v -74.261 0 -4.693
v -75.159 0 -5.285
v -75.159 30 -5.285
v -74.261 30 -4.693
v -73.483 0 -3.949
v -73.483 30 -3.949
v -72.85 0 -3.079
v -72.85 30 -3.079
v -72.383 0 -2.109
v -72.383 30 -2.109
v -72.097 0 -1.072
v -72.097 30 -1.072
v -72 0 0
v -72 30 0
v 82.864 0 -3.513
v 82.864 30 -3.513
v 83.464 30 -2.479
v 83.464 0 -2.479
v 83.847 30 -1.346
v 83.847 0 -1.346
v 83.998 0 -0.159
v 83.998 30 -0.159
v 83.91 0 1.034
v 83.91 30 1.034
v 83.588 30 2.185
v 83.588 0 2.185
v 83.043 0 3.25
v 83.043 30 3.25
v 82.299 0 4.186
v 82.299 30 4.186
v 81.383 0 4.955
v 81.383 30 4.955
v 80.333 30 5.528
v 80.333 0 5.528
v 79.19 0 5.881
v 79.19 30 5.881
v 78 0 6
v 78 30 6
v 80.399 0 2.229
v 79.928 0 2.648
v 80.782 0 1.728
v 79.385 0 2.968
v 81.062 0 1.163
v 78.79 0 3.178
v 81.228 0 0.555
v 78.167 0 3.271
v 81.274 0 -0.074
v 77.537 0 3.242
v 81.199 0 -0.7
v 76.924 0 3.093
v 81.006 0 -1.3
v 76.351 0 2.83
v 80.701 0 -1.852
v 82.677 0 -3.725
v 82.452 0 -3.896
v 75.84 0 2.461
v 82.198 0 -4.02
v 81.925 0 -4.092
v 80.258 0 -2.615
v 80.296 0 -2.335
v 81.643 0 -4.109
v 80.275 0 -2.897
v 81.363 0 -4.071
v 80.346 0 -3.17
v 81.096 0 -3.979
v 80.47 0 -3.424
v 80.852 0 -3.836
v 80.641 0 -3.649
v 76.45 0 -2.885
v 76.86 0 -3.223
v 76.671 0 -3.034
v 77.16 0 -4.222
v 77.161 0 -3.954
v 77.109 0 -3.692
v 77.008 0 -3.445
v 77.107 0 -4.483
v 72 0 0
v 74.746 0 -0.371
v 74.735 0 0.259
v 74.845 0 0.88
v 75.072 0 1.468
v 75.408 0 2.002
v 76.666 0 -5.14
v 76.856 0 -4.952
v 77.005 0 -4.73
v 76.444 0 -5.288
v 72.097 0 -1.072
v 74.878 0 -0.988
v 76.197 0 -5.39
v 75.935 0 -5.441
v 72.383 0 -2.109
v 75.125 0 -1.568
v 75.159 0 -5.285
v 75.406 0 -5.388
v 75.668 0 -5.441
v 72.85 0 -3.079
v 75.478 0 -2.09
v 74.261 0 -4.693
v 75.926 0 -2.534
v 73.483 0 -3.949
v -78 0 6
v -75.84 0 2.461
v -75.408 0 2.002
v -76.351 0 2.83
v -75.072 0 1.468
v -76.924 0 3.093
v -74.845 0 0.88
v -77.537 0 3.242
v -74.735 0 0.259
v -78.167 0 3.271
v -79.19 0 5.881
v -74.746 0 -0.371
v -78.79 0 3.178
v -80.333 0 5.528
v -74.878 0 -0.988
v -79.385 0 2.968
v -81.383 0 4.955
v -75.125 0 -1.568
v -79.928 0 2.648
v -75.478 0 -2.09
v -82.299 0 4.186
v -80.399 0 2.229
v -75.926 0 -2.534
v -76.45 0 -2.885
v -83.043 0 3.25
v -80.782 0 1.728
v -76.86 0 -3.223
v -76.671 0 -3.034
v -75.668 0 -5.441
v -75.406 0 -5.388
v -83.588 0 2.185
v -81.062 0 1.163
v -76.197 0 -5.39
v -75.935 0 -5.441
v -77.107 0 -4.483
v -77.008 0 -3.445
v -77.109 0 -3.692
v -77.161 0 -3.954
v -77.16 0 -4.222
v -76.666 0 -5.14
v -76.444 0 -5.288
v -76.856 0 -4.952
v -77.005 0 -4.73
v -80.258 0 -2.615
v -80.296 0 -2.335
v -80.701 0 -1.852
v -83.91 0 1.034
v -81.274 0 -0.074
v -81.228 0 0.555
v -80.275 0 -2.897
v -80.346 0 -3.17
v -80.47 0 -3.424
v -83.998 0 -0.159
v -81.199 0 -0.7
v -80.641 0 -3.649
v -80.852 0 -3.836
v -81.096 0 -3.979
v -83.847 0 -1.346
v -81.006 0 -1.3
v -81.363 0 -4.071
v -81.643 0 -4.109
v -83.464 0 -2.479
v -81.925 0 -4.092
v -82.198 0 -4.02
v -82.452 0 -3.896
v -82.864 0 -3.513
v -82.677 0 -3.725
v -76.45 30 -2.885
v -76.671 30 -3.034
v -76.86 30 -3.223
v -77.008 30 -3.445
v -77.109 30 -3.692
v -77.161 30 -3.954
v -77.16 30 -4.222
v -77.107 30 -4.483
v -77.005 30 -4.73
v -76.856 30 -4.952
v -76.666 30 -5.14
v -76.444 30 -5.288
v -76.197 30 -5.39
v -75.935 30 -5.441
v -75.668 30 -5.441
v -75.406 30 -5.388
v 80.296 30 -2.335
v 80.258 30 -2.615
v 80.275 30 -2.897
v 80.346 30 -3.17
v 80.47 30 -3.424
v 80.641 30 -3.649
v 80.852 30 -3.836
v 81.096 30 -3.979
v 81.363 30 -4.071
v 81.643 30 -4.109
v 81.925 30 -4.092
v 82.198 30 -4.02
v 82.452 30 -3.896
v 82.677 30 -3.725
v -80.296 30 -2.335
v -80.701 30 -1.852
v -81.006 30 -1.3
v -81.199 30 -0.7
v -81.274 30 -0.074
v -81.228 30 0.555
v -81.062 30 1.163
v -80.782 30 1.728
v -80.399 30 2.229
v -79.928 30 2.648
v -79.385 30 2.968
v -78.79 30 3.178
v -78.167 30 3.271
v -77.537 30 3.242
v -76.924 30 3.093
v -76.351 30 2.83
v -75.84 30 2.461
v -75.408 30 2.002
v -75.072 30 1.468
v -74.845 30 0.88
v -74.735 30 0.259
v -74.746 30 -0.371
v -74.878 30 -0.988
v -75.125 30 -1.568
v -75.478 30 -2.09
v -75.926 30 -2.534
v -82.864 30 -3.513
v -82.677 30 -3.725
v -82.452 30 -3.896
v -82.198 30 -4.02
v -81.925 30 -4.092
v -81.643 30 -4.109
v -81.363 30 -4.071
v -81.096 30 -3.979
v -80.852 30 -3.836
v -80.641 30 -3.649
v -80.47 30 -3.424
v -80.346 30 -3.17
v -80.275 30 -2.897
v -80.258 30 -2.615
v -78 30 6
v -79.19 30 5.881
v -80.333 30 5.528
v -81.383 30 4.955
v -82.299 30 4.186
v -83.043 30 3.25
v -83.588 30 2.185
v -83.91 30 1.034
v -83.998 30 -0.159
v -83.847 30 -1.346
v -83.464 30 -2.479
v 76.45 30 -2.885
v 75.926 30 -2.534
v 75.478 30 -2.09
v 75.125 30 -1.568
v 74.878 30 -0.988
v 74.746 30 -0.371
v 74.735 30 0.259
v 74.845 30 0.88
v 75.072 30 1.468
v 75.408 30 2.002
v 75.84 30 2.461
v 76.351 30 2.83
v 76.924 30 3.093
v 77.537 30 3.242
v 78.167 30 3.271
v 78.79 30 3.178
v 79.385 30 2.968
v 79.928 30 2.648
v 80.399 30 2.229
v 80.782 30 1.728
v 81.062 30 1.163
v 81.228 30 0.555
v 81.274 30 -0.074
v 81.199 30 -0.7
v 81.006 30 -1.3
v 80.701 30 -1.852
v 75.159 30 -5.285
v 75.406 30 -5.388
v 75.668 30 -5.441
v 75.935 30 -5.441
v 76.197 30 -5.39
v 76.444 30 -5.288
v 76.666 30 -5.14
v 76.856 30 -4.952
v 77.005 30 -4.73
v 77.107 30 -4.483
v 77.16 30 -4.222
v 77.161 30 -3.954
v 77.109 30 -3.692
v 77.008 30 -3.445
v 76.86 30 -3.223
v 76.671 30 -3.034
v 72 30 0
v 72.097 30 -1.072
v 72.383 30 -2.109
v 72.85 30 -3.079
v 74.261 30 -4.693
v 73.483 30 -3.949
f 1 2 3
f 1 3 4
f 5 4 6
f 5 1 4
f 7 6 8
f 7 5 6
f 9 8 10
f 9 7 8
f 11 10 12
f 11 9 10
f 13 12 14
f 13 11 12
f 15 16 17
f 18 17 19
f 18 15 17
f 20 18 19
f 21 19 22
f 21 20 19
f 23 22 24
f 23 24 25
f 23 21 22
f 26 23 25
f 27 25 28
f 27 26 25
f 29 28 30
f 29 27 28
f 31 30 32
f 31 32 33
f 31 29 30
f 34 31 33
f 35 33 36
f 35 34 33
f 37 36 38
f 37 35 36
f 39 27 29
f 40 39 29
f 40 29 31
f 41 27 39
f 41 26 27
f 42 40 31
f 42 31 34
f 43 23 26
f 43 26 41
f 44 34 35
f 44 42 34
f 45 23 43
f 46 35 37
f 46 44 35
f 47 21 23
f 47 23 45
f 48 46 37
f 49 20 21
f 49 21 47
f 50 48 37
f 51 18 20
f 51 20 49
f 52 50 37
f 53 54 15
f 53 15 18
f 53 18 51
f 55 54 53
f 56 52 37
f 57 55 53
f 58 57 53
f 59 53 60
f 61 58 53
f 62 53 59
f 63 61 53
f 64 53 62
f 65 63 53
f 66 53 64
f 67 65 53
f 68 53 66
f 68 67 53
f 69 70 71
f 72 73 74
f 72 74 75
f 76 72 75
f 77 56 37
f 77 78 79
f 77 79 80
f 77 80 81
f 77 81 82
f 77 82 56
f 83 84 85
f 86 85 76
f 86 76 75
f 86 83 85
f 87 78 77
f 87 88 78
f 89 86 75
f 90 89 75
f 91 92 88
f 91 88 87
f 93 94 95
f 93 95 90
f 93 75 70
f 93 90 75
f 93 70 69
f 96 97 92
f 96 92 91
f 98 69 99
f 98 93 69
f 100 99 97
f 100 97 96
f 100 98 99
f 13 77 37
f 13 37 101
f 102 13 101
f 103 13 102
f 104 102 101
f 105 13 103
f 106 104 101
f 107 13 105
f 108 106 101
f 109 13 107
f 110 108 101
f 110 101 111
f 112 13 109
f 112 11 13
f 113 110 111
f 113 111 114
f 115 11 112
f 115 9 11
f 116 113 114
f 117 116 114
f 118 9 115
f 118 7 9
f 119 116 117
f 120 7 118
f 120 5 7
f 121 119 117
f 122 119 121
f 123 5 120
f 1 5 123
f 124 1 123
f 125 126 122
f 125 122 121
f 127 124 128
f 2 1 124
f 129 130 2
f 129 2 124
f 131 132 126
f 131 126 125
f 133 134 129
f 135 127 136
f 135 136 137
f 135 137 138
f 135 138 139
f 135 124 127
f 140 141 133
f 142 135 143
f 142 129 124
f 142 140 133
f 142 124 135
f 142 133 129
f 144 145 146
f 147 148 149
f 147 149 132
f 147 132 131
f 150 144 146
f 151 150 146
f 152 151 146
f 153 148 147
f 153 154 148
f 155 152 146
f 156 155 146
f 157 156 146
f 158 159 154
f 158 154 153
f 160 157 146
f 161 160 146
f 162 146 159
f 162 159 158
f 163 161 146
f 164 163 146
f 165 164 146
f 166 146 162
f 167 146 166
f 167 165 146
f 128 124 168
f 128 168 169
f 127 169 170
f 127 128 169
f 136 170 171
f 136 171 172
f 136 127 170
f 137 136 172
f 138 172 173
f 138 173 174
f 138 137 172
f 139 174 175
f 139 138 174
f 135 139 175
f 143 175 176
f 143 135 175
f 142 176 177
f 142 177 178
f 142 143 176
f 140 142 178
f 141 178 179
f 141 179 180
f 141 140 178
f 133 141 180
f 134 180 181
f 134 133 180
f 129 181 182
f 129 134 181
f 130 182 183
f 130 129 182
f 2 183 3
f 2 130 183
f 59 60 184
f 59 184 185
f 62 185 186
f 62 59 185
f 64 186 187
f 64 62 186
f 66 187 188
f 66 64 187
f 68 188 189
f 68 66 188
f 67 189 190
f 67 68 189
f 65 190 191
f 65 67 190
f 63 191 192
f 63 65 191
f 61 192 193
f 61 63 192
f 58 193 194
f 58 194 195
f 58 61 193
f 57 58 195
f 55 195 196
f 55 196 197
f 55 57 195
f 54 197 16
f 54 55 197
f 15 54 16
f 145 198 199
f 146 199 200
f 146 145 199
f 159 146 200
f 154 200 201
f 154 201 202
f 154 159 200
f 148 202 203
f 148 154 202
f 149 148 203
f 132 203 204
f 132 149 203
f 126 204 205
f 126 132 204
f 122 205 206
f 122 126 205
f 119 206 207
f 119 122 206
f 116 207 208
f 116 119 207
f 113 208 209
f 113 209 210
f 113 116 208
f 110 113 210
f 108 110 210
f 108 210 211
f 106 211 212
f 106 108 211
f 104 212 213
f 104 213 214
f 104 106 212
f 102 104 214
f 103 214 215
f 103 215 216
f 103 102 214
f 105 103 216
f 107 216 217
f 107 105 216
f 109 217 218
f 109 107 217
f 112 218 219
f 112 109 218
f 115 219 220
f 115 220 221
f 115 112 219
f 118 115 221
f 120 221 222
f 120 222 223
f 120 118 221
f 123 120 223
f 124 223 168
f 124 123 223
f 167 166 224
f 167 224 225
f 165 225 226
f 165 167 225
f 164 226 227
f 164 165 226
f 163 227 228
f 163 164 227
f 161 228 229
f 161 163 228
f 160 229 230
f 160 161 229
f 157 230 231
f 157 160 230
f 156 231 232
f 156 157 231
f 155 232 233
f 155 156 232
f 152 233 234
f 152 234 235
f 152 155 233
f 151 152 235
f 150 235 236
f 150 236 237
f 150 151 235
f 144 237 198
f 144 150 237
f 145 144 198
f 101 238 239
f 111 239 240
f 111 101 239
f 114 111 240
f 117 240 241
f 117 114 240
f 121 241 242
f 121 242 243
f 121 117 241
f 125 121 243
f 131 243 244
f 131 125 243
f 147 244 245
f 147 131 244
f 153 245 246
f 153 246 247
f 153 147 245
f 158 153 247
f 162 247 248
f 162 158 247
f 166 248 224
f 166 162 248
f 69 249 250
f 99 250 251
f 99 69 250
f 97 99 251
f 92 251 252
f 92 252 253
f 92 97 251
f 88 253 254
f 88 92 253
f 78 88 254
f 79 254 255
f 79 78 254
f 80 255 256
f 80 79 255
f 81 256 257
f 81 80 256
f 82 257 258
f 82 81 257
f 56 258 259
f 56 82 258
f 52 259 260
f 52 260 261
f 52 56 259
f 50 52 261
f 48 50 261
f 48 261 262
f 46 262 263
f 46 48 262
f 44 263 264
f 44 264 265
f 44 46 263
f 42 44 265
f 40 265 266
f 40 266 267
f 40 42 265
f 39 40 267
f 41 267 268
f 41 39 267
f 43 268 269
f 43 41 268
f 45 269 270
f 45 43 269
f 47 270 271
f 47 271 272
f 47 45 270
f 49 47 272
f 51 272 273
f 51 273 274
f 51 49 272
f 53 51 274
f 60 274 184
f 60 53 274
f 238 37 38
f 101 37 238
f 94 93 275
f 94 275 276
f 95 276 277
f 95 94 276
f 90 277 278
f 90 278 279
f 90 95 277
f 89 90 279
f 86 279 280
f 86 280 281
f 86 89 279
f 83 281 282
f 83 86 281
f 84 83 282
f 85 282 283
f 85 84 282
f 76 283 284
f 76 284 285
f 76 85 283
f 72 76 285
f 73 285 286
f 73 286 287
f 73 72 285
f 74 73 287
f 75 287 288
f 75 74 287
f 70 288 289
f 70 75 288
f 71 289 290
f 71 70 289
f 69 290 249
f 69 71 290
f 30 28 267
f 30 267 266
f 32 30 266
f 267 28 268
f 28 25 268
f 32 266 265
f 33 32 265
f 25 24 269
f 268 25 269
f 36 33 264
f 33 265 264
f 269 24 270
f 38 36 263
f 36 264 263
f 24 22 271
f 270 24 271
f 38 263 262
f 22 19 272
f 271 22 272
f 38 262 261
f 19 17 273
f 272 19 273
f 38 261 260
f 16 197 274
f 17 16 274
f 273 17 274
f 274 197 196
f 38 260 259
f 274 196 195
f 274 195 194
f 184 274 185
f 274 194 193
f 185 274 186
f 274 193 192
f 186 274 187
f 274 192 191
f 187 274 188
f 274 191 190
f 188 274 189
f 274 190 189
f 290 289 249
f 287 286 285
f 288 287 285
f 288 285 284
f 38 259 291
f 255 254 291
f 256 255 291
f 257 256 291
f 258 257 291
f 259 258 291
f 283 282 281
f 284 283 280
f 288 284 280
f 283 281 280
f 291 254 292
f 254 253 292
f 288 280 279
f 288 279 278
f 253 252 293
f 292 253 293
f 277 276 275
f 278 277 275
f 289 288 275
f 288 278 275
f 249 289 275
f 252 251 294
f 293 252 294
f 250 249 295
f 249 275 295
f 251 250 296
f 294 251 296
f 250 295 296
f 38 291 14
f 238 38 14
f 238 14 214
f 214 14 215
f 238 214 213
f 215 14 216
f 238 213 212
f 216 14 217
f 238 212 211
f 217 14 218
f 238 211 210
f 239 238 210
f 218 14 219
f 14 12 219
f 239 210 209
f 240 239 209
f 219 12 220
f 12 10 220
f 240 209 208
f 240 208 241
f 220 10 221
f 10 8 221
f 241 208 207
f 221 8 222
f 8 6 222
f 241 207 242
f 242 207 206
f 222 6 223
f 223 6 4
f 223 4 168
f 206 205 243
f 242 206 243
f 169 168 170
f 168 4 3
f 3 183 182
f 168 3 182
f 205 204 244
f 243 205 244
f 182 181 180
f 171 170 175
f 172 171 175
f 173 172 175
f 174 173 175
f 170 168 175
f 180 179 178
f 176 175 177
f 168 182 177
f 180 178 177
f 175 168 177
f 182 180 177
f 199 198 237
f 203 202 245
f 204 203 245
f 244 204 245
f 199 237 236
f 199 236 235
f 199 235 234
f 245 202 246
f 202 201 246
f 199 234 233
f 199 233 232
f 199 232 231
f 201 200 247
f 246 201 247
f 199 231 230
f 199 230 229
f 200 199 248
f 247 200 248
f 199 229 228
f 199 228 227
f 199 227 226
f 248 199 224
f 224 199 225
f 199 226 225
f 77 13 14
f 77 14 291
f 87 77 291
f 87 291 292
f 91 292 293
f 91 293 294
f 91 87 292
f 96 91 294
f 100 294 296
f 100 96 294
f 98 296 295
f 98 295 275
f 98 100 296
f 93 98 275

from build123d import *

# Parameters (mm, degrees)
RESSALTO_EXTRUS_O1_DEPTH = 30


with BuildPart() as part:
    # Esboço1 → Ressalto-extrusão1 (new body)
    with BuildSketch(Plane(origin=(0, 0, 0), x_dir=(1, 0, 0), z_dir=(0, 1, 0))):
        with BuildLine():
            Line((-72, 0), (72, 0))
            ThreePointArc((72, 0), (72.85009345, 3.078711179), (75.159487509, 5.285024956))
            ThreePointArc((75.159487509, 5.285024956), (77.004661638, 4.729916917), (76.449553599, 2.884742789))
            ThreePointArc((76.449553599, 2.884742789), (77.536782743, -3.242075689), (80.296246294, 2.335139815))
            ThreePointArc((80.296246294, 2.335139815), (81.096189798, 3.978813584), (82.863892701, 3.513196237))
            ThreePointArc((82.863892701, 3.513196237), (83.342245662, -2.731375348), (78, -6))
            Line((78, -6), (-78, -6))
            ThreePointArc((-78, -6), (-83.342245662, -2.731375348), (-82.863892701, 3.513196237))
            ThreePointArc((-82.863892701, 3.513196237), (-81.096189798, 3.978813584), (-80.296246294, 2.335139815))
            ThreePointArc((-80.296246294, 2.335139815), (-77.536782743, -3.242075689), (-76.449553599, 2.884742789))
            ThreePointArc((-76.449553599, 2.884742789), (-77.004661638, 4.729916917), (-75.159487509, 5.285024956))
            ThreePointArc((-75.159487509, 5.285024956), (-72.85009345, 3.078711179), (-72, 0))
        make_face()
    extrude(amount=RESSALTO_EXTRUS_O1_DEPTH)


solid = part.part
